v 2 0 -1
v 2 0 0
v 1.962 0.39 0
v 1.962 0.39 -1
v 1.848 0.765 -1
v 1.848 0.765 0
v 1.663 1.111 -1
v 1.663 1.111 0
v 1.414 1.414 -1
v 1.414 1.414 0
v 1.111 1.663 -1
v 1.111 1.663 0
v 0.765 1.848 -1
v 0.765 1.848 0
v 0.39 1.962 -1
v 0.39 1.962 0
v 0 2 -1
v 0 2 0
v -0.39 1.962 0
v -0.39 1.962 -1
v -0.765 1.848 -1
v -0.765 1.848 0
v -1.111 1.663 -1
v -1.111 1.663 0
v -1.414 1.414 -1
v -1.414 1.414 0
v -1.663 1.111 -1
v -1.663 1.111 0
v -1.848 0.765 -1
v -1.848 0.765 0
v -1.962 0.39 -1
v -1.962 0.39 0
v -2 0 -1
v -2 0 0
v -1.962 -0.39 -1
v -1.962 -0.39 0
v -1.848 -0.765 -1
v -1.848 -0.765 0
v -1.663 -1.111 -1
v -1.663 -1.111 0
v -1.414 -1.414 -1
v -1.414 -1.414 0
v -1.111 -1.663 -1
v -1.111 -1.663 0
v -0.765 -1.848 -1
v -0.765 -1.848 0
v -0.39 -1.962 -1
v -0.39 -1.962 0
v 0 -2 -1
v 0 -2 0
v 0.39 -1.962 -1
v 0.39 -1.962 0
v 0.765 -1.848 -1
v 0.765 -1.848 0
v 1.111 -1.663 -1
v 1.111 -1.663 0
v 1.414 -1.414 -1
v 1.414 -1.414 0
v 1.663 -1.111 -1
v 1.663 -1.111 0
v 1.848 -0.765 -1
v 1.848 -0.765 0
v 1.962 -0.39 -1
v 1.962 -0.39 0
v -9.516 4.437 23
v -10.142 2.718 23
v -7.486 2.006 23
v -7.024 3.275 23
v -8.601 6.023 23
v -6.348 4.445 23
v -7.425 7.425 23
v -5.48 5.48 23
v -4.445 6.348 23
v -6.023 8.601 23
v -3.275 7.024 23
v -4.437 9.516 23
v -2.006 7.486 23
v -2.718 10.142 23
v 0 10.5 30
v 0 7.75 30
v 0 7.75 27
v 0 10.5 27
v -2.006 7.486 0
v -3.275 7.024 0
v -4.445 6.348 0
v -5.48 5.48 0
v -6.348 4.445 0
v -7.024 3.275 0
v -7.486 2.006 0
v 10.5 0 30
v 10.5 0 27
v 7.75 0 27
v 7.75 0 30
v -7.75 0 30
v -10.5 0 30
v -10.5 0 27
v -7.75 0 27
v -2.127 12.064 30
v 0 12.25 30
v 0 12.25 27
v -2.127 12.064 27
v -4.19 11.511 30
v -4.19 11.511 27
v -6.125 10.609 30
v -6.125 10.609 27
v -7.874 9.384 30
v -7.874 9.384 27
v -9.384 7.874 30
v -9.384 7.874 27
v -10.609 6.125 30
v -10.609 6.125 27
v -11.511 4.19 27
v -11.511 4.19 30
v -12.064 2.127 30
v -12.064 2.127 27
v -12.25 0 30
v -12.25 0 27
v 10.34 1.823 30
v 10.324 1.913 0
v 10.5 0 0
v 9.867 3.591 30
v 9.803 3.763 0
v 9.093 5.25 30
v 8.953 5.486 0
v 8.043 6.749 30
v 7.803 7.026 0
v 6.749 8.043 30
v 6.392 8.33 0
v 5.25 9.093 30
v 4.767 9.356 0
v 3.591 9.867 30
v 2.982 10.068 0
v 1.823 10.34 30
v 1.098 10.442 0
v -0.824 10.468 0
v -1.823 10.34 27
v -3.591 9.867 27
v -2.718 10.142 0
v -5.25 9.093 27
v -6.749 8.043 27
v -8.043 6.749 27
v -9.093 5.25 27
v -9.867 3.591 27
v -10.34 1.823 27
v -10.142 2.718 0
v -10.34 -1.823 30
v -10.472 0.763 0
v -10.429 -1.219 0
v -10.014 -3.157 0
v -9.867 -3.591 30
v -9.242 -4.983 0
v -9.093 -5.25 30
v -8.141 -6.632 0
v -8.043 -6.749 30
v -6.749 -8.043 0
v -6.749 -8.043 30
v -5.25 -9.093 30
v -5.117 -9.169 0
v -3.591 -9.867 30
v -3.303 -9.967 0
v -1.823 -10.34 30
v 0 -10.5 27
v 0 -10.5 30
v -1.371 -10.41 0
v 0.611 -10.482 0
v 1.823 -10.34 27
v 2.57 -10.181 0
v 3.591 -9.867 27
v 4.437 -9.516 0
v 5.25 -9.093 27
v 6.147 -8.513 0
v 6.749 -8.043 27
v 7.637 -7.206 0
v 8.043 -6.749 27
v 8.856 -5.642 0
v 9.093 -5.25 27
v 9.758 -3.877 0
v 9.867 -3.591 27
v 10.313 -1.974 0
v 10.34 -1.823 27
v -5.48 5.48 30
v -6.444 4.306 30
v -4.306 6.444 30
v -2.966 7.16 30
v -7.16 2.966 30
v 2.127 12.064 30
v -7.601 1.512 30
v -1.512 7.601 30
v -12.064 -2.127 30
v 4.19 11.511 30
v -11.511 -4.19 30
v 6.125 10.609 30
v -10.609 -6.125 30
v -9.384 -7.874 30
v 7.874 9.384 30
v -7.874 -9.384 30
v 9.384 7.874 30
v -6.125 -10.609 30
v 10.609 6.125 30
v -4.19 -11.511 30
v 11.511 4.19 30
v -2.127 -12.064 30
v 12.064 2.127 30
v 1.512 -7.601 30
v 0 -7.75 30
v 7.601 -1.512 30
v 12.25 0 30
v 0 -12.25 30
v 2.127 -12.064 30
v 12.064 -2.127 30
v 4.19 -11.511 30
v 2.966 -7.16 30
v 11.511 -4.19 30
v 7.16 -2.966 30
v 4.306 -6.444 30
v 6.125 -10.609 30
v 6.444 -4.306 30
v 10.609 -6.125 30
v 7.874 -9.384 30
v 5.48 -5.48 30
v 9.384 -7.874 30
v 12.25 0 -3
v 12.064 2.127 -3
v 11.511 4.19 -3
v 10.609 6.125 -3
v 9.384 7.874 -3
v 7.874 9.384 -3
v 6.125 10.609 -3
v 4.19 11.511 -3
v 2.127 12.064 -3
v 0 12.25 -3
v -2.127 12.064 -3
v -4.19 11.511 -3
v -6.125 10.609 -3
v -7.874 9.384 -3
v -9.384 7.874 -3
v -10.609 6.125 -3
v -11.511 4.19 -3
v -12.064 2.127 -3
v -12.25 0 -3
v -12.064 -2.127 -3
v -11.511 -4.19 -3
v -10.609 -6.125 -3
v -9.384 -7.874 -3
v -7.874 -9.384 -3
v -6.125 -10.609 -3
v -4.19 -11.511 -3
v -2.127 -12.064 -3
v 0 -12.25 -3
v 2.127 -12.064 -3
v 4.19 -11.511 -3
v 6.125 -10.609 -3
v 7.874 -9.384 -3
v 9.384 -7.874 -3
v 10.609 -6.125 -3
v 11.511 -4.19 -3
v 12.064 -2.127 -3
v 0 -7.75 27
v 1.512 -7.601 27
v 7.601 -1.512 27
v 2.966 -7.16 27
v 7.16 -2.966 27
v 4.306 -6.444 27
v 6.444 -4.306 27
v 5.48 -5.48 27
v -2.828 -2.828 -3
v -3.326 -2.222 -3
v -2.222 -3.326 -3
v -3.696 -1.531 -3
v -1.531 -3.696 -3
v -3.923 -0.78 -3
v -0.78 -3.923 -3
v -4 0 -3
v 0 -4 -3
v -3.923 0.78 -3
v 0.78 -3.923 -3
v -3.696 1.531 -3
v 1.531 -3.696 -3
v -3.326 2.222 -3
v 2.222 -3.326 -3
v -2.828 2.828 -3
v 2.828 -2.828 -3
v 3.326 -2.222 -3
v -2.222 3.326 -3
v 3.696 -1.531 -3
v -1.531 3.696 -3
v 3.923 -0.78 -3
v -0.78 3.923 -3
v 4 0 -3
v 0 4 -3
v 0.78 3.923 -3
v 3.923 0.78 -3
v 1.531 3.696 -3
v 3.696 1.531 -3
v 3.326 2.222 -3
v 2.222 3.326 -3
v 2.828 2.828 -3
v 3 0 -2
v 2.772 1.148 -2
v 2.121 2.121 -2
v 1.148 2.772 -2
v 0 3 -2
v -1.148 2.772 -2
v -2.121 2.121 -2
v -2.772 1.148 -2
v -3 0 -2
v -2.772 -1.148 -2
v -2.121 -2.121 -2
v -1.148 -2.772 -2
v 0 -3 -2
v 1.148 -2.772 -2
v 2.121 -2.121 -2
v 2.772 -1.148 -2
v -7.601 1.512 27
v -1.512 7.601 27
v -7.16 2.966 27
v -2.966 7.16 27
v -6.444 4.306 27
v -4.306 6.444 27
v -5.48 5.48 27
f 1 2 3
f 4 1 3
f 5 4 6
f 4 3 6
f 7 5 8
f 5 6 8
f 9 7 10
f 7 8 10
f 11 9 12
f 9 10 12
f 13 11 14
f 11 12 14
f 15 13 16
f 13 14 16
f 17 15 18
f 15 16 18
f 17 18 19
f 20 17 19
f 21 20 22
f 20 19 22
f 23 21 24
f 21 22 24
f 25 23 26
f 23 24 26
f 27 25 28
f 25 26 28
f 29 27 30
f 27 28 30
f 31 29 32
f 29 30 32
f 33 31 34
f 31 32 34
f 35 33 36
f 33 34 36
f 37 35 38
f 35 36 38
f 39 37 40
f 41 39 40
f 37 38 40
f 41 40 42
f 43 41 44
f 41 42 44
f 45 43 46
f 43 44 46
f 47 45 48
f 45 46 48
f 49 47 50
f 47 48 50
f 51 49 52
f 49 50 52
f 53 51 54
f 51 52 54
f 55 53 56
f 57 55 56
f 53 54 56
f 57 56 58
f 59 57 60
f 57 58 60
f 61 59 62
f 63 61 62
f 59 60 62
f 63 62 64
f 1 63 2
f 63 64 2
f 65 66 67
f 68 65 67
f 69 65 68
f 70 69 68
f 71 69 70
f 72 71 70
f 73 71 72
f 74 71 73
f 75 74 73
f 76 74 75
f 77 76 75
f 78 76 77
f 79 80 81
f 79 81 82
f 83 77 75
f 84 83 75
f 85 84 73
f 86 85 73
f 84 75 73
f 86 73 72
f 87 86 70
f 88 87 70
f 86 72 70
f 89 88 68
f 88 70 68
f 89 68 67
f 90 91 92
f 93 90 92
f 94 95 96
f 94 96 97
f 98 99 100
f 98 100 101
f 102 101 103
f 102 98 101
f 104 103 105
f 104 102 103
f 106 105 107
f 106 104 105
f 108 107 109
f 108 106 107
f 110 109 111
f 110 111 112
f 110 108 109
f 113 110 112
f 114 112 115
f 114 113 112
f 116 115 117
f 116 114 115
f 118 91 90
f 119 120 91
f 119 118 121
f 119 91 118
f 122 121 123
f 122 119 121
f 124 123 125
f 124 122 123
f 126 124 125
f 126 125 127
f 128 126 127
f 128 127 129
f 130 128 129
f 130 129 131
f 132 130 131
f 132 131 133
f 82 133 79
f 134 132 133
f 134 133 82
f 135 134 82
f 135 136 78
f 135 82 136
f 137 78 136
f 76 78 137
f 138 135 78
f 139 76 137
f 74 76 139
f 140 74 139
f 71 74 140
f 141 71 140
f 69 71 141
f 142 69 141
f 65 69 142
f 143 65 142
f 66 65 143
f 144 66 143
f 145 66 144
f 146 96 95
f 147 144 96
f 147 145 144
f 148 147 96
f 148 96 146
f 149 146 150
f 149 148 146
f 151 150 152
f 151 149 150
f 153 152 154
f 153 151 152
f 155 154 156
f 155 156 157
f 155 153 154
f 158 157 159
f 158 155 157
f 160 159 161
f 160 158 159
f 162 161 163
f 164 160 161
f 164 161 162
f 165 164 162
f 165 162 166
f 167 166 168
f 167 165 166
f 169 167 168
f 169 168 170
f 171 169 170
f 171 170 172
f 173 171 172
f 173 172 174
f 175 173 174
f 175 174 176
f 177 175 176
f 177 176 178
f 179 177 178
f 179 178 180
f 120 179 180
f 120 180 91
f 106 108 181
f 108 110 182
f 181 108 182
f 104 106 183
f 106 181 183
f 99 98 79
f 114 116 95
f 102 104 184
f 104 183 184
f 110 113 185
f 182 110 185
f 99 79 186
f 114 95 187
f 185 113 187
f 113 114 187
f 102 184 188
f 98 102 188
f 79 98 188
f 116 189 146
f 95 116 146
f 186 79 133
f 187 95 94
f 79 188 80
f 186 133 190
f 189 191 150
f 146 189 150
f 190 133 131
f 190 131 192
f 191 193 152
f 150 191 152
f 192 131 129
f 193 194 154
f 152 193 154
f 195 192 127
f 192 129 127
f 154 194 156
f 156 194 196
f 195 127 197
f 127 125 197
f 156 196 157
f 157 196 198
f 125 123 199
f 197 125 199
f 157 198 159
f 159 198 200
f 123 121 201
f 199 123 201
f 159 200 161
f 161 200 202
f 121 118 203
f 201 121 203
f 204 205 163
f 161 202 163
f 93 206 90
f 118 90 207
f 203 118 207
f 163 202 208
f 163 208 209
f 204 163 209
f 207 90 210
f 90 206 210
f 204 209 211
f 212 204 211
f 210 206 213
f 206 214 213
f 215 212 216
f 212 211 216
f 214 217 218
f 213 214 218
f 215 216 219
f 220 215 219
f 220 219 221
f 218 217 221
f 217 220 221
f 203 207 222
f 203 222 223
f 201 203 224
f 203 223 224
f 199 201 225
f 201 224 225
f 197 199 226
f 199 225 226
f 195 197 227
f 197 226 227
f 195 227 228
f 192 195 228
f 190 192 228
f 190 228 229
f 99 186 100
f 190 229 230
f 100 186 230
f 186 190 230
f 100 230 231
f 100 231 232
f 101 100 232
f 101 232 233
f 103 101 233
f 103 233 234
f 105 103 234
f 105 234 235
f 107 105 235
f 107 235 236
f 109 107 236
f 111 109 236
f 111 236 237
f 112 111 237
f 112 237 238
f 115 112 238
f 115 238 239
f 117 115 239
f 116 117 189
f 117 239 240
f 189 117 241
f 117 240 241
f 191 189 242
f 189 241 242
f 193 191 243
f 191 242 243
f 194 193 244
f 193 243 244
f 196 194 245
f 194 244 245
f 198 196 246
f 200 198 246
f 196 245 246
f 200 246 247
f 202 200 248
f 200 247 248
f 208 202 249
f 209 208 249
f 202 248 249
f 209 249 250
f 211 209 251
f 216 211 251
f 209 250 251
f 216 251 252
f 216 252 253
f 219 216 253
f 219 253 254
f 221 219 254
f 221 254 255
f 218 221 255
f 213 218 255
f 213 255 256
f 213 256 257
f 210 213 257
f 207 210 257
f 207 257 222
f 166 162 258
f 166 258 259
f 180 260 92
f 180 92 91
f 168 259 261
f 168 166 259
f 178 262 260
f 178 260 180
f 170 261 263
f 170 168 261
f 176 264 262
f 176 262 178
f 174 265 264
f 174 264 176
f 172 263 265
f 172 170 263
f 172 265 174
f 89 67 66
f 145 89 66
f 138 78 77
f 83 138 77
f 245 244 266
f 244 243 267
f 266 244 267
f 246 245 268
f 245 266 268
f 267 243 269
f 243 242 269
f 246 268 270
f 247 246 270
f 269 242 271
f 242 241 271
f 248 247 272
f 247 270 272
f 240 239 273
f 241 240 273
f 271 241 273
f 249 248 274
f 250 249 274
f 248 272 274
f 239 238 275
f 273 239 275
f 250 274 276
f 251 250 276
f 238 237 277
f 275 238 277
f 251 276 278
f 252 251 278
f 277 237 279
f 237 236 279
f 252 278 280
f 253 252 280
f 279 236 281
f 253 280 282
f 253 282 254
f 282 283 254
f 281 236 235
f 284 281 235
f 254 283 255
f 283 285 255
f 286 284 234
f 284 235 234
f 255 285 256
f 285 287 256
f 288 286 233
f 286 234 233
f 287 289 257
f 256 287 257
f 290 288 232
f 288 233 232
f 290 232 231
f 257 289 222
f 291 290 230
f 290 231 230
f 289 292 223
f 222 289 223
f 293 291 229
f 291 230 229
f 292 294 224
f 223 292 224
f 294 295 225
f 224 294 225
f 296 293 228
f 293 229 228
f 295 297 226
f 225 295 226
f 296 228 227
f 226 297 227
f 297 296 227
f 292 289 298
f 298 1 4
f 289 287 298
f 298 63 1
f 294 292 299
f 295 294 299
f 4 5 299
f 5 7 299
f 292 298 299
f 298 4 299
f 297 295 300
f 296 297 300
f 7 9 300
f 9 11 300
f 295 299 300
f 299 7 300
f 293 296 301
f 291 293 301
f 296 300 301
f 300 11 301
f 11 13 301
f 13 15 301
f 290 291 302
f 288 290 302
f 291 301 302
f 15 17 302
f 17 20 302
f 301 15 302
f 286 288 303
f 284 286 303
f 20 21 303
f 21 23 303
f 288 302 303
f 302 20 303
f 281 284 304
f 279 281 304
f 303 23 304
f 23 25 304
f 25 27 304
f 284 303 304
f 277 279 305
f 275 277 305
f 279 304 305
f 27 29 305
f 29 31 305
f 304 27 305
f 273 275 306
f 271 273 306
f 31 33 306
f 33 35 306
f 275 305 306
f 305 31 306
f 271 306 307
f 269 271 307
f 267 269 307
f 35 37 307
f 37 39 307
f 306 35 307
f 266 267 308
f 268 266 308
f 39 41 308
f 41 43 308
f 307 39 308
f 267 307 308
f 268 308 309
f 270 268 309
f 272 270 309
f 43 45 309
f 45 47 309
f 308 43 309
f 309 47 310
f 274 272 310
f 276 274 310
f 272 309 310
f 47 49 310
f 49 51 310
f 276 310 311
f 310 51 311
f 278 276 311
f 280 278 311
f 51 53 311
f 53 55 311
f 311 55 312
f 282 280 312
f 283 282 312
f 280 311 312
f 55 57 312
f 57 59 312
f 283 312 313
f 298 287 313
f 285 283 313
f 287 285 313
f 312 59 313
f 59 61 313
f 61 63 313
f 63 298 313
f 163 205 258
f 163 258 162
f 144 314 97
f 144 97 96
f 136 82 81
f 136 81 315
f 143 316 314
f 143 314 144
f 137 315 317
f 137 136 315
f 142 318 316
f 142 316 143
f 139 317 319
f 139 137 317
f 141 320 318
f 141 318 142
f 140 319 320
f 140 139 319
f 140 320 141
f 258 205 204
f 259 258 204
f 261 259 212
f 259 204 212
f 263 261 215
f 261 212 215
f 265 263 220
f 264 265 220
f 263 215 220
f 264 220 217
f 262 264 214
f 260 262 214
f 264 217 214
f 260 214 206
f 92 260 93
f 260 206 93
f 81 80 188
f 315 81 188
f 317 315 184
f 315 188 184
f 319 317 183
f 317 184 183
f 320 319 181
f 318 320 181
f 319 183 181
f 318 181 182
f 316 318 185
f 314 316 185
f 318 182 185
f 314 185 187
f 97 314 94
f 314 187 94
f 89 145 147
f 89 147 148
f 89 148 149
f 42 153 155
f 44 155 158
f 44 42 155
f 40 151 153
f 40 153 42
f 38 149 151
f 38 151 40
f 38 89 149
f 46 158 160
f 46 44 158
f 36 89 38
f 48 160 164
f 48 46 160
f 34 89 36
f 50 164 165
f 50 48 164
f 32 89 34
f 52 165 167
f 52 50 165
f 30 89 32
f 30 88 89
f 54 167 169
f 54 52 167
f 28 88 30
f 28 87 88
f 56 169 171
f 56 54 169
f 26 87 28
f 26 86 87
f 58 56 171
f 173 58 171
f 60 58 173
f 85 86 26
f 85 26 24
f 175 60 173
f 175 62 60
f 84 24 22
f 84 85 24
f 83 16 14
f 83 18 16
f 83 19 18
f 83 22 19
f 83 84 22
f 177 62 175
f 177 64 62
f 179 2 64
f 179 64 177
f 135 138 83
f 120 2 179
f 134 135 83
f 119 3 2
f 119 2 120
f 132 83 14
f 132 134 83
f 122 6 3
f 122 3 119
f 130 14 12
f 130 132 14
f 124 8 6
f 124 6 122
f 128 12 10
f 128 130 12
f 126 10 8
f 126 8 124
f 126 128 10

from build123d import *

# Parameters (mm, degrees)
SKETCH_R           = 12.25
SKETCH_R_2         = 2
PAD_DEPTH          = 3
SKETCH001_R        = 12.25
SKETCH001_R_2      = 10.5
PAD001_DEPTH       = 30
PAD002_DEPTH       = 3
POLARPATTERN_COUNT = 2
PAD003_DEPTH       = 23
CHAMFER_SIZE       = 2


with BuildPart() as part:
    # Sketch → Pad (new body)
    with BuildSketch(Plane.XY):
        Circle(SKETCH_R)
        Circle(SKETCH_R_2, mode=Mode.SUBTRACT)
    extrude(amount=-PAD_DEPTH)

    # Sketch001 → Pad001 (join)
    with BuildSketch(Plane.XY):
        Circle(SKETCH001_R)
        Circle(SKETCH001_R_2, mode=Mode.SUBTRACT)
    extrude(amount=PAD001_DEPTH)

    # Sketch002 → Pad002 (join)
    with BuildSketch(Plane.XY.offset(30)):
        with BuildLine():
            ThreePointArc((0, 7.75), (-5.480078, 5.480078), (-7.75, 0))
            Line((-12.25, 0), (-7.75, 0))
            ThreePointArc((0, 12.25), (-8.662058, 8.662058), (-12.25, 0))
            Line((0, 7.75), (0, 12.25))
        make_face()
    pad002 = extrude(amount=-PAD002_DEPTH)

    # PolarPattern: Pad002 ×2 about axis
    polarpattern_axis = Axis((0, 0, 30), (0, 0, 1))
    for i in range(1, POLARPATTERN_COUNT):
        add(pad002.rotate(polarpattern_axis, i * 360 / POLARPATTERN_COUNT))

    # Sketch003 (on DatumPlane) → Pad003 (join)
    with BuildSketch(Plane.XY.offset(23)):
        with BuildLine():
            ThreePointArc((-3.170533, 11.832591), (-8.662058, 8.662058), (-11.832591, 3.170533))
            Line((-7.485925, 2.005848), (-11.832591, 3.170533))
            ThreePointArc((-2.005848, 7.485925), (-5.480078, 5.480078), (-7.485925, 2.005848))
            Line((-3.170533, 11.832591), (-2.005848, 7.485925))
        make_face()
    extrude(amount=-PAD003_DEPTH)

    # Chamfer
    chamfer_edges = [part.edges().sort_by_distance(p)[0] for p in [
        (-2, 0, -3),
    ]]
    chamfer(chamfer_edges, length=CHAMFER_SIZE)


solid = part.part
